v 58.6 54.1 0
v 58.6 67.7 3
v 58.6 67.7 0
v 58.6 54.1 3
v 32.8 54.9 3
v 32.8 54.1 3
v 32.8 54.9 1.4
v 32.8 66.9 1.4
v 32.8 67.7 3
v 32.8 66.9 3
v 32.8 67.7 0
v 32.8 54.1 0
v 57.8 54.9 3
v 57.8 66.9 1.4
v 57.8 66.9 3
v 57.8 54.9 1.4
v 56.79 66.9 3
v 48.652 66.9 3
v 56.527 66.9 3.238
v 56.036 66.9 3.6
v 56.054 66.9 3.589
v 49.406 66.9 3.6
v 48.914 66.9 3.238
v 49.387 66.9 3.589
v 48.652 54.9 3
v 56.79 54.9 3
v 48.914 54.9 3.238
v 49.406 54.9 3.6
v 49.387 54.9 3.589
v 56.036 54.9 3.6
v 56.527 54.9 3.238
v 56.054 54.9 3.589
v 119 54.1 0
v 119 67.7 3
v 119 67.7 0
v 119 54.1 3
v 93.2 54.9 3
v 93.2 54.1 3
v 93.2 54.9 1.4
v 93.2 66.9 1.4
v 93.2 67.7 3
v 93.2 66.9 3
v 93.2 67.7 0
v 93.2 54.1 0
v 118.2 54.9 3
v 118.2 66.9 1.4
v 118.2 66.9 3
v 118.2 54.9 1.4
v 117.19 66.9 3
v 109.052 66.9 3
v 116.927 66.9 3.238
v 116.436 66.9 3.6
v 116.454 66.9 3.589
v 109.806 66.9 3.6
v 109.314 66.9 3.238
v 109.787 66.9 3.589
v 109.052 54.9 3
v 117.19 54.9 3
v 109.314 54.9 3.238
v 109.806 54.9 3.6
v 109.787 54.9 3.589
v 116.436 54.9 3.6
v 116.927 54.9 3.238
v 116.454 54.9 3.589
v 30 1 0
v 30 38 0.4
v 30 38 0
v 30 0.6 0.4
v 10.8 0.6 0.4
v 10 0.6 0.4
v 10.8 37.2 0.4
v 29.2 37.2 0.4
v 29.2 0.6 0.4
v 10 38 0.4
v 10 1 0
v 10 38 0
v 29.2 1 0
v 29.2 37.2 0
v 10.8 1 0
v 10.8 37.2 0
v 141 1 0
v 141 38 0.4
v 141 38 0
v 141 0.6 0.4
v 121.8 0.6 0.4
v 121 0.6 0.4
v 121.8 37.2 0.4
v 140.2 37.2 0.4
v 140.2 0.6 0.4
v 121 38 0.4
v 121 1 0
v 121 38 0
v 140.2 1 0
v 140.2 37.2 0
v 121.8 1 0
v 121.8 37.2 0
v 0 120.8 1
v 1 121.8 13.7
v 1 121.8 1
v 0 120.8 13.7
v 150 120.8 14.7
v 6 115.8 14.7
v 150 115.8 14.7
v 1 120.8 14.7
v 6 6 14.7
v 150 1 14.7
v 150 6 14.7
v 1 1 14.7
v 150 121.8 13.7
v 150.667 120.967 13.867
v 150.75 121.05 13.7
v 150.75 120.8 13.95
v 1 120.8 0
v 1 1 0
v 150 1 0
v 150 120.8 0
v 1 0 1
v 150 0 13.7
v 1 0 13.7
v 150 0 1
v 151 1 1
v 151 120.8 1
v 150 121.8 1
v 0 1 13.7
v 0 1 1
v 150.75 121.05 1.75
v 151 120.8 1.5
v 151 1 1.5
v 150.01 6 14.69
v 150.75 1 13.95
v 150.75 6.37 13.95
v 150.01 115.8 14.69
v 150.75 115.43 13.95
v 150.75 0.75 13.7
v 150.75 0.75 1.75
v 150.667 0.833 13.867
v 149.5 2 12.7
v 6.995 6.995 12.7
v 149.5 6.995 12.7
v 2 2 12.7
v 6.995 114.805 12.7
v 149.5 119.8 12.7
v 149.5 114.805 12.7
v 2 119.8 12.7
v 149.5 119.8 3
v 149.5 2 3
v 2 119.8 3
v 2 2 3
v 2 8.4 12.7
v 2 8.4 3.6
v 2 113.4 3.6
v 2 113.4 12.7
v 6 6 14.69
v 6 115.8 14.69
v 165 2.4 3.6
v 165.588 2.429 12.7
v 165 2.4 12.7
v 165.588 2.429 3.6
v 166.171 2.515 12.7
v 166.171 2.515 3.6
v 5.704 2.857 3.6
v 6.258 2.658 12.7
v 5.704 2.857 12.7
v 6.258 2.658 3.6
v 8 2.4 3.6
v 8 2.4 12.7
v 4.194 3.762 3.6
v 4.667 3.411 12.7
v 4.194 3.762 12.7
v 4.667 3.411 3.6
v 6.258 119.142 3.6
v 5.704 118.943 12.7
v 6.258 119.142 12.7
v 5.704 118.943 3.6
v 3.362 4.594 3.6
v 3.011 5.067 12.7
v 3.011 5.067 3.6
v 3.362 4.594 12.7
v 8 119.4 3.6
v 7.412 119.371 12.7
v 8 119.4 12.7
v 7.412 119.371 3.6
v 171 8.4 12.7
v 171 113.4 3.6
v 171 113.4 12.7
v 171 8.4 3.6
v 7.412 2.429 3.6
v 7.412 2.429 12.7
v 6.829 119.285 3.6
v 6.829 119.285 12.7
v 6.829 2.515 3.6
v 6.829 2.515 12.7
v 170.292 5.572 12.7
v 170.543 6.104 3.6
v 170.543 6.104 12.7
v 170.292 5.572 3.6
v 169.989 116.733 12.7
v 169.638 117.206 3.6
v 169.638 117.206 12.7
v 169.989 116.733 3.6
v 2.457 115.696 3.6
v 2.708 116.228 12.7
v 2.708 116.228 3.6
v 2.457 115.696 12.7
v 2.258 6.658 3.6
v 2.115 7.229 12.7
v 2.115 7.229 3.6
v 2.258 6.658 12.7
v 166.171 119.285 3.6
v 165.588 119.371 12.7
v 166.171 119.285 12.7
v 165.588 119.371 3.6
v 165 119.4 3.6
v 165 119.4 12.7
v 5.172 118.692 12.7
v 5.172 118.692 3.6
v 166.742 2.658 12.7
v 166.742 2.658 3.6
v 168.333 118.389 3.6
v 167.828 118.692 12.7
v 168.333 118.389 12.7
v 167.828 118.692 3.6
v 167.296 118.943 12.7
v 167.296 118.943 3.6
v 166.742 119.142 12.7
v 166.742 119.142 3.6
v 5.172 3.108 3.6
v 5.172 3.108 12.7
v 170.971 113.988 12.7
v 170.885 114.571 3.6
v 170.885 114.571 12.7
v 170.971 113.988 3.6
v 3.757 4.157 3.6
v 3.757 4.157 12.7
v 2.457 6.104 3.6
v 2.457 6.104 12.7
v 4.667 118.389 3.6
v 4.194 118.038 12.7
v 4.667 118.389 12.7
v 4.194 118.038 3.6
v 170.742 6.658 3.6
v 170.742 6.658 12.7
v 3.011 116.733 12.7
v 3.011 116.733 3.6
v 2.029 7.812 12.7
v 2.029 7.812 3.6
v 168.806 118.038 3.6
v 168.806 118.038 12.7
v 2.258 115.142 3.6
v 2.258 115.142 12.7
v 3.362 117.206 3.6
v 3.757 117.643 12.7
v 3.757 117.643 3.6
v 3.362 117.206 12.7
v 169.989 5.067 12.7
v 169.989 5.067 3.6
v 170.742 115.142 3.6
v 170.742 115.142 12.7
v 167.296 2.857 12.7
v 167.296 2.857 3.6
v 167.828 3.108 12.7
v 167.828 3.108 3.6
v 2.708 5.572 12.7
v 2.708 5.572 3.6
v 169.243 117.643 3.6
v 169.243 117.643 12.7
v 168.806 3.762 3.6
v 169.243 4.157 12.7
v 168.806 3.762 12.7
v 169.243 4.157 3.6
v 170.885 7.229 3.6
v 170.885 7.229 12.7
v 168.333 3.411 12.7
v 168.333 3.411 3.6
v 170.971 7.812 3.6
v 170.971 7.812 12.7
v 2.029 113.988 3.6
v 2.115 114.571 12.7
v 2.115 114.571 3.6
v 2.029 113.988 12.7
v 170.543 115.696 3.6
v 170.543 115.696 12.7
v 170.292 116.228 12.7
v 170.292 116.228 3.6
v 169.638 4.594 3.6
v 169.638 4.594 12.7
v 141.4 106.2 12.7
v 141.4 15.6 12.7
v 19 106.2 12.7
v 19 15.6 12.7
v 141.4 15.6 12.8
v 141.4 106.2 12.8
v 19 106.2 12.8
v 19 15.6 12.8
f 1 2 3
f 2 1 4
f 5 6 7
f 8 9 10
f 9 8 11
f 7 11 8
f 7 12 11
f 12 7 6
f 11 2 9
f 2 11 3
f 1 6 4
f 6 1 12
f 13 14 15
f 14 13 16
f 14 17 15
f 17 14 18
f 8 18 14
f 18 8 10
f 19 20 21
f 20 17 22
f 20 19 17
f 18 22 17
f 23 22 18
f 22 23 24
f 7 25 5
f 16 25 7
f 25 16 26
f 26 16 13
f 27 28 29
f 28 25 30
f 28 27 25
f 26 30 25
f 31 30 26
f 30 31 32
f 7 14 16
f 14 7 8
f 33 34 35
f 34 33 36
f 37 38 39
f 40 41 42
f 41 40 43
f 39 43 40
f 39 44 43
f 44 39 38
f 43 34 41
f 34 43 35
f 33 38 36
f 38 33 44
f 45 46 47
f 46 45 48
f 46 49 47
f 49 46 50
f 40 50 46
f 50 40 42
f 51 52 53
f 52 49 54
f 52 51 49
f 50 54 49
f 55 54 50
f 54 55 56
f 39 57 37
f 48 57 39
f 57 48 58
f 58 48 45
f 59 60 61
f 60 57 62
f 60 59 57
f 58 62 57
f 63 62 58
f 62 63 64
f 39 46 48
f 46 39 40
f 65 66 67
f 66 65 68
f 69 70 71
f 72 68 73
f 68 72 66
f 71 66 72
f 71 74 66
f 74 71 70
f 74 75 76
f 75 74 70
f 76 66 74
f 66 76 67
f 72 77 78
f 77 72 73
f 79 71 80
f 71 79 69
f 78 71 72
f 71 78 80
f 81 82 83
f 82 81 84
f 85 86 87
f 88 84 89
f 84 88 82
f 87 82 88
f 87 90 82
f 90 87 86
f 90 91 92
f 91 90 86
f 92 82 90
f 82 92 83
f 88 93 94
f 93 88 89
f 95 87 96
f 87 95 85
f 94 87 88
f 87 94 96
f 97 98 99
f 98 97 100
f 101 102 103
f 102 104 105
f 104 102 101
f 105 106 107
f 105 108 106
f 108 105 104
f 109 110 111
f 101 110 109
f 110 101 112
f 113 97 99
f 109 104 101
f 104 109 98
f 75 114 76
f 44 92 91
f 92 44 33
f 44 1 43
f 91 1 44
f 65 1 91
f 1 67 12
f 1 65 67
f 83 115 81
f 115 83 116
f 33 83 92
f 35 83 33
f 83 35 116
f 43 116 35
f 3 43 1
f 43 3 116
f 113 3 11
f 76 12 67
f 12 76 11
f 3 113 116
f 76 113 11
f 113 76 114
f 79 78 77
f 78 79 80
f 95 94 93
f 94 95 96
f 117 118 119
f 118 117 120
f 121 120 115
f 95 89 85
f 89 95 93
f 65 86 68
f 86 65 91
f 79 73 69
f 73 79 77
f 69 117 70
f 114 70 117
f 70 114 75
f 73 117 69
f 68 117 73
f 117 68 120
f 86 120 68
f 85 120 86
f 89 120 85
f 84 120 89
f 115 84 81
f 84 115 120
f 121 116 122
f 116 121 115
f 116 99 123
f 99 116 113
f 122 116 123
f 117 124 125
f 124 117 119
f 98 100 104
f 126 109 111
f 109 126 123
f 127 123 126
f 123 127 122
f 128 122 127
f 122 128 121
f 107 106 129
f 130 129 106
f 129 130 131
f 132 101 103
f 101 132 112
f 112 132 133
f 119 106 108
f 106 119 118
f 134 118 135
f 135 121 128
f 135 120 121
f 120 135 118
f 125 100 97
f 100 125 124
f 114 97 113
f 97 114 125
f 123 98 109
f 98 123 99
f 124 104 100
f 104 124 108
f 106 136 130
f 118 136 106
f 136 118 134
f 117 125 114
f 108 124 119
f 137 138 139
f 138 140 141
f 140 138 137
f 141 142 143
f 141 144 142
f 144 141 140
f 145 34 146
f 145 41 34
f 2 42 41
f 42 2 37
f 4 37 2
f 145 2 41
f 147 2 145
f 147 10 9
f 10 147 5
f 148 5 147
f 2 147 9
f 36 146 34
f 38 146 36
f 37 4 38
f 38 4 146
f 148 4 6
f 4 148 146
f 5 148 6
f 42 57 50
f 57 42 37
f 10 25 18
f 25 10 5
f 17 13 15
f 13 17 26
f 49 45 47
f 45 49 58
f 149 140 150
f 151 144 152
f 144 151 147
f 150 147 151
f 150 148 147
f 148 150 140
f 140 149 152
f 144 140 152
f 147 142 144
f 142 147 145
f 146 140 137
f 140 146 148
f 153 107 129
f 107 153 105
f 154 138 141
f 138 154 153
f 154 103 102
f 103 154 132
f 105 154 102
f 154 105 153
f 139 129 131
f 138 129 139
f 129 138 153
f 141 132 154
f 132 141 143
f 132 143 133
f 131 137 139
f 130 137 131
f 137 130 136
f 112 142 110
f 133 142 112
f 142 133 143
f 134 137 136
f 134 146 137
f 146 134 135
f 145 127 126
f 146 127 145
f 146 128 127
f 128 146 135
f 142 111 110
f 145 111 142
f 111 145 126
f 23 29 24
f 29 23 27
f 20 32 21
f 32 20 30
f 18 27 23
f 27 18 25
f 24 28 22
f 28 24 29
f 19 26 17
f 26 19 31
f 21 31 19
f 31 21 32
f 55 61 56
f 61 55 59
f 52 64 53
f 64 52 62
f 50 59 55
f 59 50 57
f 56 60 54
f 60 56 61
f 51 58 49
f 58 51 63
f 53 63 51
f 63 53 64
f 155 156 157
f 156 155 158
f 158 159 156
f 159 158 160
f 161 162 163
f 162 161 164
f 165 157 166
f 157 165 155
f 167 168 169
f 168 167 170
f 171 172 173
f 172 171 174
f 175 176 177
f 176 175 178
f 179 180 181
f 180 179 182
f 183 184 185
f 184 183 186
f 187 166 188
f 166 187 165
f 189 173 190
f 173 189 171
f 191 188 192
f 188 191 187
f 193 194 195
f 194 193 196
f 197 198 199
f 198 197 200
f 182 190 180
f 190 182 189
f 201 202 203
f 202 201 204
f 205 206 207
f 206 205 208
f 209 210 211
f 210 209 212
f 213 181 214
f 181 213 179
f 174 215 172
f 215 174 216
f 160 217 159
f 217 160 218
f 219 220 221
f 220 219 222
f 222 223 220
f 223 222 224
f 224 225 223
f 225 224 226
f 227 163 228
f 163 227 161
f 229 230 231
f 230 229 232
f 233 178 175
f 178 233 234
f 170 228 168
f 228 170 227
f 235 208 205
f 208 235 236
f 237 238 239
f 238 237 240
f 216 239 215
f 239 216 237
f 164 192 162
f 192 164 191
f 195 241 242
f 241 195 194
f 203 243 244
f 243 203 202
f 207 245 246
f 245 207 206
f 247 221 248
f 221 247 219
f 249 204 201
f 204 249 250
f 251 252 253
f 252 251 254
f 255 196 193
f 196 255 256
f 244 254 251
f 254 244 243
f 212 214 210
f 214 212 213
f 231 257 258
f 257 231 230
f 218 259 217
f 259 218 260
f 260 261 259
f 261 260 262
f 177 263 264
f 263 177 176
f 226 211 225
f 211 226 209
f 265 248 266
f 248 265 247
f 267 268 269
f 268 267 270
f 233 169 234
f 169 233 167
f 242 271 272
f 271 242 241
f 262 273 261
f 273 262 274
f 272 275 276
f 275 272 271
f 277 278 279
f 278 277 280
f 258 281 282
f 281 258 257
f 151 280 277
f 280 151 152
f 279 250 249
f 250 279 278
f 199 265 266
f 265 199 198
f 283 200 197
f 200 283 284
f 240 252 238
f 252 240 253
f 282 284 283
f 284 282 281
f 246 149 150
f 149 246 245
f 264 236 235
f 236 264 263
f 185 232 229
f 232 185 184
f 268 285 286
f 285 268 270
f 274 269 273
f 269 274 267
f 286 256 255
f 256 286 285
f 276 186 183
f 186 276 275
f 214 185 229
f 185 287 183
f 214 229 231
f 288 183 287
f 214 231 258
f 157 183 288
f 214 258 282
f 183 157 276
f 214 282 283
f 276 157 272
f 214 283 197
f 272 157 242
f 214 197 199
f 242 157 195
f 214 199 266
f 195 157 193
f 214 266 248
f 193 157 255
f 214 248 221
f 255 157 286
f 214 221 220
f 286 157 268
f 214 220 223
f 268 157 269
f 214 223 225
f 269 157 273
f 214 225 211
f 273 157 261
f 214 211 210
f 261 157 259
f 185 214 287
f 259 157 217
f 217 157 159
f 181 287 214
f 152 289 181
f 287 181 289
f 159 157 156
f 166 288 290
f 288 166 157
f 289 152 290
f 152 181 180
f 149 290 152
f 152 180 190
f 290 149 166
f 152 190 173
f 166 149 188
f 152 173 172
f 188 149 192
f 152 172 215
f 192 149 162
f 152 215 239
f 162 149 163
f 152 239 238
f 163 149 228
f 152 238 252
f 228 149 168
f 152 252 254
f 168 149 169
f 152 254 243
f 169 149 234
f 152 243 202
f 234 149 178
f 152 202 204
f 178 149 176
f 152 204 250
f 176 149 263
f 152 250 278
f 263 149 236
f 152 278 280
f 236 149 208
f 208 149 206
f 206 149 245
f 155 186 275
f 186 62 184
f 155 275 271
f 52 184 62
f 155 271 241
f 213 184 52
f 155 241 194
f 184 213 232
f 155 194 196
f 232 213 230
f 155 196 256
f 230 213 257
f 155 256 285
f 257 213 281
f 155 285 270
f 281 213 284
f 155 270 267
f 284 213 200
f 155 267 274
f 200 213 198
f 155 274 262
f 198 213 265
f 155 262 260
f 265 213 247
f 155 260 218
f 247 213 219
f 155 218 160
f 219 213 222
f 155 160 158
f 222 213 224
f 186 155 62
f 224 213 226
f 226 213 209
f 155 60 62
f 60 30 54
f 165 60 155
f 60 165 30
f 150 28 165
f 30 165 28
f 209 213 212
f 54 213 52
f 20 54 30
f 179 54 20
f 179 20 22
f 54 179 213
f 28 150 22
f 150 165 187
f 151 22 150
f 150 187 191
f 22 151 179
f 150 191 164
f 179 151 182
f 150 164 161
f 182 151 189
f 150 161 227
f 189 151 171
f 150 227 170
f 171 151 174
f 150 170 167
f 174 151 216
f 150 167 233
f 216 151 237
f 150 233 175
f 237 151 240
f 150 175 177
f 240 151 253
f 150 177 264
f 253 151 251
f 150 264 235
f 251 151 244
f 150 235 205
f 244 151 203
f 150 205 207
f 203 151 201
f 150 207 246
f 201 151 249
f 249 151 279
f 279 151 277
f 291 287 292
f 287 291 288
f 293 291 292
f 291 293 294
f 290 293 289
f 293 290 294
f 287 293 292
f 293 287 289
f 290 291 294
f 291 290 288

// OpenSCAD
// Kindle dashboard: door mount for a Kindle Paperwhite 3 hanging in landscape.
// A slot that is closed at the top, bottom and left and open to the right: the Kindle slides in from the right and is
// pulled out to the right. The power button and the USB port are on the open side. Two spring tongues in the back
// press the Kindle lightly against the front lips, so it does not rattle or slide out by itself. The mount is held
// on the door by two tesa Powerstrips Large, whose fields are marked on the back.
//
// Coordinates: X along the Kindle (to the right), Y up, Z away from the door.
// Parts:  "assembly" - preview with a Kindle in it
//         "print"    - standing on its closed left end, prints without supports
//         "test"     - a short section with one spring, to check the fit before printing the whole mount
// Author: Thorsten Kummerow <thorsten.kummerow (at) gmail (dot) com>

part = "assembly"; // [assembly, print, test]

/* [Kindle] */
kindle_l = 169;    // long edge, horizontal when hanging (Paperwhite 3: 169 x 117 x 9.1 mm)
kindle_h = 117;    // short edge
kindle_t = 9.1;    // thickness

/* [Mount] */
overhang = 20;     // how far the Kindle sticks out on the right, to take hold of it
clr_h    = 0.4;    // play above and below the Kindle
clr_t    = 0.6;    // play in the thickness; the springs take it up
back     = 3.0;    // back plate (on the door)
wall     = 2.0;    // top and bottom wall
end_wall = 2.0;    // left end wall
lip_t    = 2.0;    // thickness of the front lips
lip_w    = 5;      // how far the lips reach over the bezel (about 12 mm wide or more on the Paperwhite 3)
lip_bevel = 1.0;   // bevel of the lips toward the screen
edge     = 1.0;    // chamfer of the outer edges
entry    = 1.5;    // lead-in chamfer at the open end

/* [Springs] */
springs     = true;
spring_l    = 25;   // length of a tongue (along X)
spring_w    = 12;   // width of a tongue
spring_t    = 1.6;  // thickness of a tongue; the back plate is thinned from behind to it
spring_gap  = 0.8;  // slot around a tongue
spring_bump = 1.6;  // how far the bump reaches into the slot; the tongue bends by spring_bump - clr_t
bump_r      = 6;    // radius of the bump; 6 mm keeps its flank printable standing

/* [Powerstrips] */
strip_marks = true; // mark the fields of the strips on the back
strip_w     = 20;   // tesa Powerstrips Large: 20 x 50 mm
strip_l     = 50;
strip_tab   = 12;   // the pull tab sticks out below the mount, the strip is pulled out downward
strip_inset = 10;   // distance of the fields from the left and right end
mark_depth  = 0.4;
mark_line   = 0.8;

/* [Test section] */
test_slot = 35;     // length of the slot of the test section

$fn = 64;
eps = 0.01;

// --- derived ---
slot_l = kindle_l - overhang;
slot_h = kindle_h + 2 * clr_h;
slot_t = kindle_t + clr_t;
H = slot_h + 2 * wall;
D = back + slot_t + lip_t;
bump_len = 2 * sqrt(bump_r * bump_r - (bump_r - spring_bump) * (bump_r - spring_bump));

assert(back - spring_t + 0.65 >= spring_bump - clr_t, "The tongue would hit the door when it bends: thicker back or thinner tongue");
assert(bump_len + 2 <= spring_l, "The bump is longer than the tongue");

// --- parts ---
if (part == "assembly") {
   mount(slot_l, spring_positions(slot_l), strip_marks);
   kindle();
} else if (part == "print") {
   standing(slot_l) mount(slot_l, spring_positions(slot_l), strip_marks);
} else if (part == "test") {
   standing(test_slot) mount(test_slot, [end_wall + test_slot / 2], false);
}

// Spring centers at 30 % and 70 % of the length, clear of the Powerstrip fields near the ends
function spring_positions(sl) = springs ? [(end_wall + sl) * 0.3, (end_wall + sl) * 0.7] : [];

/// Turns the mount so that its closed left end stands on the print bed.
module standing(sl) {
   translate([D, 0, 0]) rotate([0, -90, 0]) children();
}

module mount(sl, spring_xs, marks) {
   L = end_wall + sl;
   difference() {
      chamfer_cube([L, H, D], edge);
      // Slot, open to the right
      translate([end_wall, wall, back]) cube([sl + 1, slot_h, slot_t]);
      // Window: the lips cover lip_w of the bezel and are beveled toward the screen
      hull() {
         translate([end_wall + lip_w, wall + lip_w, back + slot_t - eps])
            cube([sl - lip_w + 1, slot_h - 2 * lip_w, 2 * eps]);
         translate([end_wall + lip_w - lip_bevel, wall + lip_w - lip_bevel, D - eps])
            cube([sl - lip_w + lip_bevel + 1, slot_h - 2 * lip_w + 2 * lip_bevel, 2 * eps]);
      }
      // Lead-in at the open end
      hull() {
         translate([L - entry, wall, back]) cube([eps, slot_h, slot_t]);
         translate([L, wall - entry, back - entry]) cube([1, slot_h + 2 * entry, slot_t + 2 * entry]);
      }
      for (x = spring_xs) translate([x - spring_l / 2, (H - spring_w) / 2, 0]) spring_cut();
      if (marks)
         for (x = [strip_inset, L - strip_inset - strip_w]) translate([x, 0, 0]) strip_mark();
   }
   for (x = spring_xs) translate([x - spring_l / 2, (H - spring_w) / 2, 0]) spring_bump();
}

/// Tongue in local coordinates: root at x = 0, tip at x = spring_l, front face at z = back.
module spring_cut() {
   // Slot on both sides and around the tip
   difference() {
      translate([0, -spring_gap, -1]) cube([spring_l + spring_gap, spring_w + 2 * spring_gap, back + 2]);
      translate([-1, 0, -2]) cube([spring_l + 1, spring_w, back + 4]);
   }
   // Thinned from behind, so it can bend back without touching the door
   translate([0, 0, -1]) cube([spring_l, spring_w, back - spring_t + 1]);
}

/// Rounded bump at the tip of a tongue, so the Kindle slides over it in both directions.
module spring_bump() {
   cx = spring_l - bump_len / 2 - 1;
   intersection() {
      translate([cx, 0, back + spring_bump - bump_r]) rotate([-90, 0, 0]) cylinder(r = bump_r, h = spring_w);
      translate([0, 0, back - eps]) cube([spring_l, spring_w, spring_bump + 1]);
   }
}

/// Outline of a Powerstrip field on the back, open at the bottom where the pull tab comes out.
module strip_mark() {
   len = strip_l - strip_tab;
   difference() {
      translate([0, -1, -1]) cube([strip_w, len + 1, mark_depth + 1]);
      translate([mark_line, -2, -2]) cube([strip_w - 2 * mark_line, len + 2 - mark_line, mark_depth + 3]);
   }
}

module chamfer_cube(s, c) {
   hull() {
      translate([c, 0, c]) cube([s.x - 2 * c, s.y, s.z - 2 * c]);
      translate([0, c, c]) cube([s.x, s.y - 2 * c, s.z - 2 * c]);
      translate([c, c, 0]) cube([s.x - 2 * c, s.y - 2 * c, s.z]);
   }
}

/// The Kindle for the preview, pressed against the lips. The position of the screen is approximate.
module kindle() {
   screen = [122.4, 90.6];   // 6", 1448 x 1072 at 300 ppi, in landscape
   screen_left = 17;          // bezel on the left (the top edge of the Kindle in portrait)
   translate([end_wall, wall + clr_h, back + clr_t]) {
      color("#2b2b2b") linear_extrude(kindle_t)
         offset(r = 6) offset(delta = -6) square([kindle_l, kindle_h]);
      color("#d8d6cf") translate([screen_left, (kindle_h - screen.y) / 2, kindle_t - 0.5])
         cube([screen.x, screen.y, 0.6]);
   }
}
